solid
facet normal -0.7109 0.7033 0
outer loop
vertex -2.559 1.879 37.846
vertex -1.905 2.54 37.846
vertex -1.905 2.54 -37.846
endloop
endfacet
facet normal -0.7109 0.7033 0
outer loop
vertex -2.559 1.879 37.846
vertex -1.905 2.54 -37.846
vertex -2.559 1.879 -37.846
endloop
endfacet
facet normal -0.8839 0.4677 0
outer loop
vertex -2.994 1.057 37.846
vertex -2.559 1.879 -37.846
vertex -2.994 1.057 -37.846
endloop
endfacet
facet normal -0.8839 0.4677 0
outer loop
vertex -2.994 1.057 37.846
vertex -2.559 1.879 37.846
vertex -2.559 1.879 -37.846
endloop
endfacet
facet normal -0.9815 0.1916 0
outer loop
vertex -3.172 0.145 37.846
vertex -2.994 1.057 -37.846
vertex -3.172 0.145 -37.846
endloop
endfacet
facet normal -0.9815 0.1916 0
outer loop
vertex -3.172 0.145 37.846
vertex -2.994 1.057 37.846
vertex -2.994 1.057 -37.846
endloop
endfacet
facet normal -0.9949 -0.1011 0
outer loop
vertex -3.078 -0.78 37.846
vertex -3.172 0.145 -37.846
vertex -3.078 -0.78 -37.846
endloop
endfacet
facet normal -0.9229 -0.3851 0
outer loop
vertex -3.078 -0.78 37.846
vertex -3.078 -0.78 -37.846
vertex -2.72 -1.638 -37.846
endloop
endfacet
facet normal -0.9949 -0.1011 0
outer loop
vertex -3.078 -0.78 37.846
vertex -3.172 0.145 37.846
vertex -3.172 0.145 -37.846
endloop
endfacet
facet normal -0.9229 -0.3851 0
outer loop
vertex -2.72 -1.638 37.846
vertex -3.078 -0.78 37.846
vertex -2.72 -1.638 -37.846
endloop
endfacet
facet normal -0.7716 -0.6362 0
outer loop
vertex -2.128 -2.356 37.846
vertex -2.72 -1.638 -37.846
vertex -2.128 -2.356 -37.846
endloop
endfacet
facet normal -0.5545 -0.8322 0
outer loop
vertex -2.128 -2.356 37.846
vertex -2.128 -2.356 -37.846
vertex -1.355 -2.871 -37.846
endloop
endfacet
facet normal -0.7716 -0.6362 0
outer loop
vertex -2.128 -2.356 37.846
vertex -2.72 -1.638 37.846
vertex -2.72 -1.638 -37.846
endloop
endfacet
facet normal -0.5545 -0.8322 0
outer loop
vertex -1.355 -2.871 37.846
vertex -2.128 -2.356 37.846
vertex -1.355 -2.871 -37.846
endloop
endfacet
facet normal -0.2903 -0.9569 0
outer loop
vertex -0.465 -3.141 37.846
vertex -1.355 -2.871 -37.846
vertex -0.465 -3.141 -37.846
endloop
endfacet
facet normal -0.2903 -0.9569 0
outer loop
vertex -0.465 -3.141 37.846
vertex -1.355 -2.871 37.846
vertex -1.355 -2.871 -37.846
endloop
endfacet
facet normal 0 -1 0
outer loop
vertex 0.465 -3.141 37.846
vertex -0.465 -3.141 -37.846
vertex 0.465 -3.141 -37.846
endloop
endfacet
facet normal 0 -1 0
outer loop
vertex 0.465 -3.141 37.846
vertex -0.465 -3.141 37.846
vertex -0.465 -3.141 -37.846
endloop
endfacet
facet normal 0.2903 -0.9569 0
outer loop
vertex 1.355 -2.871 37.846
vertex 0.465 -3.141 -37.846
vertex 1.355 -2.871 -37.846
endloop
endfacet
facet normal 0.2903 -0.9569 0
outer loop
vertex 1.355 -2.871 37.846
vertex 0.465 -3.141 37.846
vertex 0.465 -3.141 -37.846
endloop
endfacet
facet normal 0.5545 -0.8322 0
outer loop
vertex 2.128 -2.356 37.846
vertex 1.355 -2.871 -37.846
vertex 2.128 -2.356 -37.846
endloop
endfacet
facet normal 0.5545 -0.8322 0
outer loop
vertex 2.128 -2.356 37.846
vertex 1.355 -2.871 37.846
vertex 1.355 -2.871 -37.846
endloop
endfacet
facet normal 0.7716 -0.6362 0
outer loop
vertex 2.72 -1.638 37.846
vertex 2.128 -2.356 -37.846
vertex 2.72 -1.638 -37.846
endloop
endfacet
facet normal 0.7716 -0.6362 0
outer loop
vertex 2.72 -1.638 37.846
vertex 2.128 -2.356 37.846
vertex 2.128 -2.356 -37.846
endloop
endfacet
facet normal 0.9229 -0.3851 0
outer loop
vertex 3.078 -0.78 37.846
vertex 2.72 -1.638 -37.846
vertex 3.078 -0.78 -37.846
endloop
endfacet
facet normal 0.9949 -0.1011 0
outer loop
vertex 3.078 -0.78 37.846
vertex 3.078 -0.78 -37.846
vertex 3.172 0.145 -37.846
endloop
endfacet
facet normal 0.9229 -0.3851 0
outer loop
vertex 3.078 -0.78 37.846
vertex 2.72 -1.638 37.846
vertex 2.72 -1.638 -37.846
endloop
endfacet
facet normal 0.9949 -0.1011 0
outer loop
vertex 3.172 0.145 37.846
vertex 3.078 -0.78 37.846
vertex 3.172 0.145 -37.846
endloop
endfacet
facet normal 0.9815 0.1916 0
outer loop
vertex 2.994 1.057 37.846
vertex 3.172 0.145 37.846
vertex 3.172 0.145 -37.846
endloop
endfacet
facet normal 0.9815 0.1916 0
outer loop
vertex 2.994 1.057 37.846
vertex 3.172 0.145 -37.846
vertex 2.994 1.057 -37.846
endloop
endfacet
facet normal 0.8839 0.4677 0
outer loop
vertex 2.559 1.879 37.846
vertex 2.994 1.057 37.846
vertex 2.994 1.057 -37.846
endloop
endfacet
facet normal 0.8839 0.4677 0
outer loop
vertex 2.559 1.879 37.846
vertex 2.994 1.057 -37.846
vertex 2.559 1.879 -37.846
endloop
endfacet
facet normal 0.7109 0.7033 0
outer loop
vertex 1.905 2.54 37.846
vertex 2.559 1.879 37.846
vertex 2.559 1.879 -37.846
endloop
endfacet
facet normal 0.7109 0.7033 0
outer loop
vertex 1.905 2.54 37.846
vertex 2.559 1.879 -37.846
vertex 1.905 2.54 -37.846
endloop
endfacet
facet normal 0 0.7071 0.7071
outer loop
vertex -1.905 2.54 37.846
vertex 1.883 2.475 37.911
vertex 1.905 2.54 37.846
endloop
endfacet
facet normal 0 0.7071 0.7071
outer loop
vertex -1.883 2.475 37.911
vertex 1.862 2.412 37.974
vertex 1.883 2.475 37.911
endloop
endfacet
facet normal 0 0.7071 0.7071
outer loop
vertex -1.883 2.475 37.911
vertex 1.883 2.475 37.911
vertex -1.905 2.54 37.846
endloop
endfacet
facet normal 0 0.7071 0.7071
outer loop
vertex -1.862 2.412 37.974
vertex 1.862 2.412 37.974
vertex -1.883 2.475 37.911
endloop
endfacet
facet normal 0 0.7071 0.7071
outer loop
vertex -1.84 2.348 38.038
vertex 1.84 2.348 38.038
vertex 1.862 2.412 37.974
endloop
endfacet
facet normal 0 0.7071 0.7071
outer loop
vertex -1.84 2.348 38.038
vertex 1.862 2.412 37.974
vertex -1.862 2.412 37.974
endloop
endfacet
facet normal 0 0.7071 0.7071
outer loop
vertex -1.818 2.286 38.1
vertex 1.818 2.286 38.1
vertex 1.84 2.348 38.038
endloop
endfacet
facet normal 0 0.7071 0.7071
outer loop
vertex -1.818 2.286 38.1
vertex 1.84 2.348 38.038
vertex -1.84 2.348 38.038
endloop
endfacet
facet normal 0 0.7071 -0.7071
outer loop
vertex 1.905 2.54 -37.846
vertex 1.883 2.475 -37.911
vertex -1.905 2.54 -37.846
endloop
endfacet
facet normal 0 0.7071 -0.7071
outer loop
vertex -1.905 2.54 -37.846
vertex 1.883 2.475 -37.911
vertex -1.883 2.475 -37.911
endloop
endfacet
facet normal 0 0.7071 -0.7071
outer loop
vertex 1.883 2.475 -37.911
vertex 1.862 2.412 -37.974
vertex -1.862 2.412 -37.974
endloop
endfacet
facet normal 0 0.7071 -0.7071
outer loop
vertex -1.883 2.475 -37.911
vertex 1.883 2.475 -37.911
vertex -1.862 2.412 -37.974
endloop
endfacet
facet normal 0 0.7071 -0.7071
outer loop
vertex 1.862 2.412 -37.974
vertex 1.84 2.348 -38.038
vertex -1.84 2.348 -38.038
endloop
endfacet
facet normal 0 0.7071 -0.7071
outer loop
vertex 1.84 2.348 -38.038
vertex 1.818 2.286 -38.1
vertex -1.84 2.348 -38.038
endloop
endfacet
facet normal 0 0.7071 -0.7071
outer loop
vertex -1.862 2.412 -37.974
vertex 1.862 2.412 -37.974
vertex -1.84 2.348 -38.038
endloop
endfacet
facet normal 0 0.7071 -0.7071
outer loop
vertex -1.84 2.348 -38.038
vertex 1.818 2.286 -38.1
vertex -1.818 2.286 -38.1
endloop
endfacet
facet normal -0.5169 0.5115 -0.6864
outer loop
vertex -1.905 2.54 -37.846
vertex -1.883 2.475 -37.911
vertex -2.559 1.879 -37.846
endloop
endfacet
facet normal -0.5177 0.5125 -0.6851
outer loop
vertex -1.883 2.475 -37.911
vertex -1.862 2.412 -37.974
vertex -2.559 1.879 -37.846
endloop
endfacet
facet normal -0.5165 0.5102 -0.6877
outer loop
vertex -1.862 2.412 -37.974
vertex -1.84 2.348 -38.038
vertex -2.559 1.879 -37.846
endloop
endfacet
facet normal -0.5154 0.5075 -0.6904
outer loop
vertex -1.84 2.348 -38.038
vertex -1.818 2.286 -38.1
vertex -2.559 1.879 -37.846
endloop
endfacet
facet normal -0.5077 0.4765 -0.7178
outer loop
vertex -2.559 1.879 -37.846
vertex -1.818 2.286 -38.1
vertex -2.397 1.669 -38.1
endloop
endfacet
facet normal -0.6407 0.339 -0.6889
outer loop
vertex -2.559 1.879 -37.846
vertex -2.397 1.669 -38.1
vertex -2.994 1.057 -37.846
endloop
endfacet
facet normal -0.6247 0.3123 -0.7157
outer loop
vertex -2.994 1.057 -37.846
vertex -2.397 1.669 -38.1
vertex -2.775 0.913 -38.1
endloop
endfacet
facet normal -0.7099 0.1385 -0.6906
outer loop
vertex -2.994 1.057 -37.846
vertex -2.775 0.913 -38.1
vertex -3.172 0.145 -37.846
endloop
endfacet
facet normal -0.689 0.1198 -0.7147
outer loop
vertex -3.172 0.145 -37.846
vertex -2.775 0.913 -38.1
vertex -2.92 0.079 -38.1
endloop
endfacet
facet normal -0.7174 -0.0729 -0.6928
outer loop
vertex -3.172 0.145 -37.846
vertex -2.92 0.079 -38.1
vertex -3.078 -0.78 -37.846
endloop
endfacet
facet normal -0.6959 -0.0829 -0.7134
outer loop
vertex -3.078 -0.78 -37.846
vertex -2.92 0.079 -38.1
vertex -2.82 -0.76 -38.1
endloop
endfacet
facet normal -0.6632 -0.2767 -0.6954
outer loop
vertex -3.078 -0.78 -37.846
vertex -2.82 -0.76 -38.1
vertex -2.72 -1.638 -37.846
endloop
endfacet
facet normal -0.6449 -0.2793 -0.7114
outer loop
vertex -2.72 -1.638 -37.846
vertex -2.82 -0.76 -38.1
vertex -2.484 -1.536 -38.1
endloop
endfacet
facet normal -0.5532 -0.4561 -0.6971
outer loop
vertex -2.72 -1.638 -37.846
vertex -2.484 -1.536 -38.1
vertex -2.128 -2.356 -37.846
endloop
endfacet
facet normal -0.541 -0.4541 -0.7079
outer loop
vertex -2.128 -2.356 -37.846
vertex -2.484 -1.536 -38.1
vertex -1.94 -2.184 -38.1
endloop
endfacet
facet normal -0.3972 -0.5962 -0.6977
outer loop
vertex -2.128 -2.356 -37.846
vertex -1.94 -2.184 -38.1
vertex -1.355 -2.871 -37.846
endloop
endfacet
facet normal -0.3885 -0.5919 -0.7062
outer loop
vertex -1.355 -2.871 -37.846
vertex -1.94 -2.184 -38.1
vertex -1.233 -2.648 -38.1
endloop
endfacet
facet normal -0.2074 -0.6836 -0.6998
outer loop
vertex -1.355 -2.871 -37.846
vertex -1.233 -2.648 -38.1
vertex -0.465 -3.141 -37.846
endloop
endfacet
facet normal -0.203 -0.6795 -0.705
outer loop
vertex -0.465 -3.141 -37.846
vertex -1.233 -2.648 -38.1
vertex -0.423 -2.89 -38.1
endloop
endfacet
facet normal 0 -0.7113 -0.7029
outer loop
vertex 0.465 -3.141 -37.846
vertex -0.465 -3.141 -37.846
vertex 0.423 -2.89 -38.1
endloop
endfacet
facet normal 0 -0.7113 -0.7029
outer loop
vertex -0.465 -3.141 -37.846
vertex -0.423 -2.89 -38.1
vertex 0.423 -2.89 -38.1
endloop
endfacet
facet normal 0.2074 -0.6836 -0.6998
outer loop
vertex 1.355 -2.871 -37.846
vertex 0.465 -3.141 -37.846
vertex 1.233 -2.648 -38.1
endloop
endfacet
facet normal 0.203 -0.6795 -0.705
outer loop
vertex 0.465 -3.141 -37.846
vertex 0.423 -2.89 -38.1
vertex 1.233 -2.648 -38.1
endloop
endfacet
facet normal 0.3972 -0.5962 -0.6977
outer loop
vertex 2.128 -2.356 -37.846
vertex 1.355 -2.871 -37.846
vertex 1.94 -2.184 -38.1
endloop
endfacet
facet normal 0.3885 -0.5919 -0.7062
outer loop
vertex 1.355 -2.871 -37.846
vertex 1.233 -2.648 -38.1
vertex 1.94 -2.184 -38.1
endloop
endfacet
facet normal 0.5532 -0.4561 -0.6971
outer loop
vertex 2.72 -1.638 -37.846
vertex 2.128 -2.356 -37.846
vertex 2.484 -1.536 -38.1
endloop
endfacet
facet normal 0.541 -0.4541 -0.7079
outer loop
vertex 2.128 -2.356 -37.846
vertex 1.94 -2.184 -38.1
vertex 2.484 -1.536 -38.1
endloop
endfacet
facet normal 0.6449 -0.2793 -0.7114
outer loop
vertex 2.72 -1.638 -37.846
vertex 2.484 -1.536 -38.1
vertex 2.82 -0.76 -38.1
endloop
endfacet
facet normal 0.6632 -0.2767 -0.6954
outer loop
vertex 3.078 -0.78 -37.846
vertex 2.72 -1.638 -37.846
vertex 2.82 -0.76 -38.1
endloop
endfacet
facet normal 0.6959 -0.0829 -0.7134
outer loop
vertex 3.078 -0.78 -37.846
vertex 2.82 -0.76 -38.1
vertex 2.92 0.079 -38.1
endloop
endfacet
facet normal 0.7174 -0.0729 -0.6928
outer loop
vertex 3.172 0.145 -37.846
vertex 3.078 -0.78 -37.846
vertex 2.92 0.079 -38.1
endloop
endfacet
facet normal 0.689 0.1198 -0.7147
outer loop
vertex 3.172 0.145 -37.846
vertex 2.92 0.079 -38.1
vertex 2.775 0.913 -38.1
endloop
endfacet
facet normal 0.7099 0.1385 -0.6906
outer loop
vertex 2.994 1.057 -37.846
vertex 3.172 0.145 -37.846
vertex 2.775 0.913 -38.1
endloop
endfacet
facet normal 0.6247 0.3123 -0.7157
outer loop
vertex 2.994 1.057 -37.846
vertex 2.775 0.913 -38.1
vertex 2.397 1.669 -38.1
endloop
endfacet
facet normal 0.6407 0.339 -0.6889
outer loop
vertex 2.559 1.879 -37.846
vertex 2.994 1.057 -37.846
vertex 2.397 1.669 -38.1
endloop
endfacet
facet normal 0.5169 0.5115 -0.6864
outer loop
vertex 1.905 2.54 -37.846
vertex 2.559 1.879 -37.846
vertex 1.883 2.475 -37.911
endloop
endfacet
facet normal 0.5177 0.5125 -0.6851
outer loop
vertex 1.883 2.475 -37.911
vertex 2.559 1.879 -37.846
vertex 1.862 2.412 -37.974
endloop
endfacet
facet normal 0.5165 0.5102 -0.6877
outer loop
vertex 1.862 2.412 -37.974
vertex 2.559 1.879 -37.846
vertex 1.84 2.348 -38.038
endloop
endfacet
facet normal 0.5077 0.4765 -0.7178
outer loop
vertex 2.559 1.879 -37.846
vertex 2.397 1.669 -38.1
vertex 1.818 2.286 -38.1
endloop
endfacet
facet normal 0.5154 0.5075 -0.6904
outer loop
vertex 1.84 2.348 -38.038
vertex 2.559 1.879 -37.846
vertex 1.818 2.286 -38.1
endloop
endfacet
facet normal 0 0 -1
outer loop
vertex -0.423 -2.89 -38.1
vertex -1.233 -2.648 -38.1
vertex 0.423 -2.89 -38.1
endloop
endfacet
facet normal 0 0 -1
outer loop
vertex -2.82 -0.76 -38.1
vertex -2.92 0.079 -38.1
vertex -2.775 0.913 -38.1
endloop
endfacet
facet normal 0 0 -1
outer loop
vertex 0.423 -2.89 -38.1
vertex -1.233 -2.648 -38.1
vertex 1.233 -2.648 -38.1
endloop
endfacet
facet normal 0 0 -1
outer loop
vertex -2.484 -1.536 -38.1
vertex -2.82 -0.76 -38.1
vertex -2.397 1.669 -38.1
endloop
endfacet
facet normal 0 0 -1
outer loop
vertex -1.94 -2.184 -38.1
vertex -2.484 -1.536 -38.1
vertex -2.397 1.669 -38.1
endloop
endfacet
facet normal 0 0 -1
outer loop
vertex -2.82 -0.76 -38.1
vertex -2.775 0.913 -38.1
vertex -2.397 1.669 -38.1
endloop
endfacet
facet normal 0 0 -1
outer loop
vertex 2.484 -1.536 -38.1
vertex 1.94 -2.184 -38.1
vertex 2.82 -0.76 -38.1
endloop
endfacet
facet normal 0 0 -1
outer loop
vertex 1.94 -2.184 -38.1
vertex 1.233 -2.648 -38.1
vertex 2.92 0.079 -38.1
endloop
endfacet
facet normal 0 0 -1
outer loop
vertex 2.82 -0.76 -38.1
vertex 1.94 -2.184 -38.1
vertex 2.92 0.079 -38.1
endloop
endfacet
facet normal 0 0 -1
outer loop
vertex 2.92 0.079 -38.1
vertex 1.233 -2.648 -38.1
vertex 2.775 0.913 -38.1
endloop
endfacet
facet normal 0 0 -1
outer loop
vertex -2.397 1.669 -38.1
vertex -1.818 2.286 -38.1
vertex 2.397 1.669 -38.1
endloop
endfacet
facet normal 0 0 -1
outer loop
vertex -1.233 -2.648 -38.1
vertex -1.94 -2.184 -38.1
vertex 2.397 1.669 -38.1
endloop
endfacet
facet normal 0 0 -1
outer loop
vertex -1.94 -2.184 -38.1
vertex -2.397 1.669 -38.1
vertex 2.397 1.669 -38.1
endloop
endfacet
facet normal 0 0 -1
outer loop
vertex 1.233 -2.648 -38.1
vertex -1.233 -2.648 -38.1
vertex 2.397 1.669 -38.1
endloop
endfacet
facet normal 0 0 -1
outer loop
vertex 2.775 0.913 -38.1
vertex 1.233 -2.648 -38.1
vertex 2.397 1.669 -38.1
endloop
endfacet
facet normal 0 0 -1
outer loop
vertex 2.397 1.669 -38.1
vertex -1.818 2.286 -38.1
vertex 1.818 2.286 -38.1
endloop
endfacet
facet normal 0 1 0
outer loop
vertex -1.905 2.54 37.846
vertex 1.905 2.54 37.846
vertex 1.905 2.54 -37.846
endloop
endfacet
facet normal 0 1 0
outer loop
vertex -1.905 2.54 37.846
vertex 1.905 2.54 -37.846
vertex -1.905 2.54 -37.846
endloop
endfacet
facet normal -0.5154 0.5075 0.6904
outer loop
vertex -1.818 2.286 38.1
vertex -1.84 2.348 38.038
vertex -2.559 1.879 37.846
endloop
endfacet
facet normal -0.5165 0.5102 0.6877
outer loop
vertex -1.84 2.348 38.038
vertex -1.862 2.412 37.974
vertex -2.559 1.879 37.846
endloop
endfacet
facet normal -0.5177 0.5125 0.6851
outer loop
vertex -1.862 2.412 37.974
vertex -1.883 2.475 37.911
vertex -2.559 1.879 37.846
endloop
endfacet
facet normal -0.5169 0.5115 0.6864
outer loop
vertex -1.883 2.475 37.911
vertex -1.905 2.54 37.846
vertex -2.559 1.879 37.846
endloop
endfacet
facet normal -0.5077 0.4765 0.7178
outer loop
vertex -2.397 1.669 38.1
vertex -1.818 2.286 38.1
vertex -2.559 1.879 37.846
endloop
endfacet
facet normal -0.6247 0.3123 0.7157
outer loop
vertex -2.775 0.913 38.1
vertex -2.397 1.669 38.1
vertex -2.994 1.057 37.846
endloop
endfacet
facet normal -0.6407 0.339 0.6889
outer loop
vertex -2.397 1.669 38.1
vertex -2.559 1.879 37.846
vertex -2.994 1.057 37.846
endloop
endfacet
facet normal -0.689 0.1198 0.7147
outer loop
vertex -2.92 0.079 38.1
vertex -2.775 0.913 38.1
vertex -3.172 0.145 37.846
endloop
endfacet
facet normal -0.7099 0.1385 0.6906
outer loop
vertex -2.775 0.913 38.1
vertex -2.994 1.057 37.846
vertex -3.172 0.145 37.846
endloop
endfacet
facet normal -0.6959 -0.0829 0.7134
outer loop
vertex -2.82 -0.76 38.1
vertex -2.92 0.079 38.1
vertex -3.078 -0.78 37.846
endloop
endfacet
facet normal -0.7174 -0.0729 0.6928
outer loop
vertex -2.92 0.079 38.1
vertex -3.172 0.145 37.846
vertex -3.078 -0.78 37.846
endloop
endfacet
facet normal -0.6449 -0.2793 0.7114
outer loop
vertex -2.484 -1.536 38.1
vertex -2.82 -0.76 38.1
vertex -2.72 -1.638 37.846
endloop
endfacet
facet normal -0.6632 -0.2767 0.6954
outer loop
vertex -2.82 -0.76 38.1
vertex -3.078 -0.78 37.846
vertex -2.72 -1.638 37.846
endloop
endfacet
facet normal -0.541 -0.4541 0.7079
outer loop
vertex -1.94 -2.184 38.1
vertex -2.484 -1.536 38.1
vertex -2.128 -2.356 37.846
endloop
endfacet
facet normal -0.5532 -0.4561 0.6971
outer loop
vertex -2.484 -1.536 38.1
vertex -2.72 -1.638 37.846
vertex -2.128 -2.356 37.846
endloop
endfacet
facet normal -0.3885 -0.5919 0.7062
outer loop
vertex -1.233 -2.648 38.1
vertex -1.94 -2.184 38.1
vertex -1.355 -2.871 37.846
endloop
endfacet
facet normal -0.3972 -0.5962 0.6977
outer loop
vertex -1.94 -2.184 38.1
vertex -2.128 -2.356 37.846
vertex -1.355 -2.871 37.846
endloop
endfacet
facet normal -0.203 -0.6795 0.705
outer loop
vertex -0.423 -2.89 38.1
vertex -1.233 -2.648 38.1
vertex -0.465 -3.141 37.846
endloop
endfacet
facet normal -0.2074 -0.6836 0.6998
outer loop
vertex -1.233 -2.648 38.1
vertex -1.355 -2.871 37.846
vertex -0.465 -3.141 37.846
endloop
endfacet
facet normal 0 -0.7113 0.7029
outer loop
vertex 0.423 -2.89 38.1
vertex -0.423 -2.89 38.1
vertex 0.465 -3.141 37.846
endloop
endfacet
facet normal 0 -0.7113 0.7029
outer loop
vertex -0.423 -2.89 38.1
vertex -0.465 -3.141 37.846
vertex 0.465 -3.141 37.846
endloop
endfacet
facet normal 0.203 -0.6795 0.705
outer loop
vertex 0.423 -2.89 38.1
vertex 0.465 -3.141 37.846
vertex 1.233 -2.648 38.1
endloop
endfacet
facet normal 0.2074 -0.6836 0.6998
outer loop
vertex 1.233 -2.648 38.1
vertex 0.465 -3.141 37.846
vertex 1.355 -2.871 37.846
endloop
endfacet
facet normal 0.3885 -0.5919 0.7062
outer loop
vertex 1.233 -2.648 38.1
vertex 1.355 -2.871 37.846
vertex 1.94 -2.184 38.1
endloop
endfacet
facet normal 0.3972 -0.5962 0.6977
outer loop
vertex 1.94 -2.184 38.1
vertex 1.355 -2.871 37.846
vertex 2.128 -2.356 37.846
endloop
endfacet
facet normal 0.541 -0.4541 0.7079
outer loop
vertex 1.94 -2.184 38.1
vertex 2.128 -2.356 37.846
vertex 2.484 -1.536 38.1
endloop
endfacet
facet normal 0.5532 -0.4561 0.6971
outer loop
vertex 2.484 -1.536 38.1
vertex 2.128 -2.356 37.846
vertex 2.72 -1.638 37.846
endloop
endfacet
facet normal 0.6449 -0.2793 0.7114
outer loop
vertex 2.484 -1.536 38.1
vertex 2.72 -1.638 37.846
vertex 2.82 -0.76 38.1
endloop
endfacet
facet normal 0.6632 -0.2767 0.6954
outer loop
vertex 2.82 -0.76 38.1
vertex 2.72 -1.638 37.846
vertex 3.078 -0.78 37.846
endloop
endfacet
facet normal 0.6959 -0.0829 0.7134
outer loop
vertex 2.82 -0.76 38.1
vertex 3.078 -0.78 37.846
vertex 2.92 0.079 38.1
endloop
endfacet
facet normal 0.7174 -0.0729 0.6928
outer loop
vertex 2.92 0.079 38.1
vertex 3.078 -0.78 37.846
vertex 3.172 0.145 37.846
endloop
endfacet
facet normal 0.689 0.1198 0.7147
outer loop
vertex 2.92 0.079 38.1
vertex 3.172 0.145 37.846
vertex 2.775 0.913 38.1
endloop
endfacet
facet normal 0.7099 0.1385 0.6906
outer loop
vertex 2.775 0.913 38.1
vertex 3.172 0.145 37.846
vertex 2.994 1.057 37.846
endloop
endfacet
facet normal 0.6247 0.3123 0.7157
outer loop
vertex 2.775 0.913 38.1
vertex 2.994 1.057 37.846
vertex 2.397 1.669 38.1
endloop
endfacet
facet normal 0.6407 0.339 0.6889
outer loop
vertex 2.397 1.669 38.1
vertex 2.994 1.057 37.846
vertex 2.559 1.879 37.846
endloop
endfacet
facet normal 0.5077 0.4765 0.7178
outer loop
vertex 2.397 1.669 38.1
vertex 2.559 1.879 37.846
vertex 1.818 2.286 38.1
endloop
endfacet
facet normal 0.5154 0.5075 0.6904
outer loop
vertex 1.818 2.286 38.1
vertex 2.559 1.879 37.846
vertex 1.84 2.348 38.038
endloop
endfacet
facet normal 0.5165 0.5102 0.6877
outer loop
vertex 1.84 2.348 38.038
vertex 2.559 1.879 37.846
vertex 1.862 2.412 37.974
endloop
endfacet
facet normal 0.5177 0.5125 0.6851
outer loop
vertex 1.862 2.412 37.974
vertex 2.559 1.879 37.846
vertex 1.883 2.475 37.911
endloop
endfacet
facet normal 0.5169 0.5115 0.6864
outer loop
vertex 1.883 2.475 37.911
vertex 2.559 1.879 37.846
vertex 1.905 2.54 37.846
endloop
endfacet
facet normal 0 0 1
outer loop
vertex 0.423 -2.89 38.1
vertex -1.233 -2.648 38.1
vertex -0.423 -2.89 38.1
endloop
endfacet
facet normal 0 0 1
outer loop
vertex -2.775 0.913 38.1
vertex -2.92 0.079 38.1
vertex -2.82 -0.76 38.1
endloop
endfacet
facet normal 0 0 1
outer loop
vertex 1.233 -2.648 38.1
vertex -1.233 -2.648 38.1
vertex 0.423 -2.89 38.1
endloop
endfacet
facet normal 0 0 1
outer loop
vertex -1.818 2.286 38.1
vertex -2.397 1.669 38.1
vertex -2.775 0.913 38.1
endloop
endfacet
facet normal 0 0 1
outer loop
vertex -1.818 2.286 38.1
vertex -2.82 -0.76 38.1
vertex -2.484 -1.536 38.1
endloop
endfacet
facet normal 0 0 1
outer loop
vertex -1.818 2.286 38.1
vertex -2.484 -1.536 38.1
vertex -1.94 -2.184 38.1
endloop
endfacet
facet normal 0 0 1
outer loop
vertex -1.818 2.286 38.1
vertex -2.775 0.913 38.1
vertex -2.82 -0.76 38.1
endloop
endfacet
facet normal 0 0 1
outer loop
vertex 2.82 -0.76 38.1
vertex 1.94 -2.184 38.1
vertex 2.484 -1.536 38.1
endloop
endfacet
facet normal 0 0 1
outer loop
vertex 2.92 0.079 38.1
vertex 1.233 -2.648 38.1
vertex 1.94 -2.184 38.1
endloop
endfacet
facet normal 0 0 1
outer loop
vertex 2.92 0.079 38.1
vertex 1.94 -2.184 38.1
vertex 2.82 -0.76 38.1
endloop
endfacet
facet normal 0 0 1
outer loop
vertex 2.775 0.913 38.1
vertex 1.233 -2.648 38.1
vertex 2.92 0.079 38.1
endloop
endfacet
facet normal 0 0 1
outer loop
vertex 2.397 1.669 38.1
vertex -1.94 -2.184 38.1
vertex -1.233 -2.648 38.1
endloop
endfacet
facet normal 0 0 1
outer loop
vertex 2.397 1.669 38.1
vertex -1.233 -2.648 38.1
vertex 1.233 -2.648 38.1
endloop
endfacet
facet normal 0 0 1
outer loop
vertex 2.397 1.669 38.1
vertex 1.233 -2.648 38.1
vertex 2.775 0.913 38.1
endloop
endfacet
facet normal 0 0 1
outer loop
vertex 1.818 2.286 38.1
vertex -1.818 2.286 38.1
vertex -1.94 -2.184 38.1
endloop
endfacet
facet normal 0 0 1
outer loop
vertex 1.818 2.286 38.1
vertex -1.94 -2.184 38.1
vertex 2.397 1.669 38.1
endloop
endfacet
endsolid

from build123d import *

# Parameters (mm, degrees)
BOSS_EXTRUDE1_DEPTH = 38.1
CHAMFER1_SIZE       = 0.254


with BuildPart() as part:
    # Sketch1 → Boss-Extrude1 (new body, symmetric)
    with BuildSketch(Plane.XY):
        with BuildLine():
            Line((1.905, 2.54), (-1.905, 2.54))
            ThreePointArc((-1.905, 2.54), (0, -3.175), (1.905, 2.54))
        make_face()
    extrude(amount=BOSS_EXTRUDE1_DEPTH, both=True)

    # Chamfer1
    chamfer1_edges = [part.edges().sort_by_distance(p)[0] for p in [
        (0, 2.54, -38.1),
        (0, -3.175, -38.1),
        (0, -3.175, 38.1),
        (0, 2.54, 38.1),
    ]]
    chamfer(chamfer1_edges, length=CHAMFER1_SIZE)


solid = part.part
